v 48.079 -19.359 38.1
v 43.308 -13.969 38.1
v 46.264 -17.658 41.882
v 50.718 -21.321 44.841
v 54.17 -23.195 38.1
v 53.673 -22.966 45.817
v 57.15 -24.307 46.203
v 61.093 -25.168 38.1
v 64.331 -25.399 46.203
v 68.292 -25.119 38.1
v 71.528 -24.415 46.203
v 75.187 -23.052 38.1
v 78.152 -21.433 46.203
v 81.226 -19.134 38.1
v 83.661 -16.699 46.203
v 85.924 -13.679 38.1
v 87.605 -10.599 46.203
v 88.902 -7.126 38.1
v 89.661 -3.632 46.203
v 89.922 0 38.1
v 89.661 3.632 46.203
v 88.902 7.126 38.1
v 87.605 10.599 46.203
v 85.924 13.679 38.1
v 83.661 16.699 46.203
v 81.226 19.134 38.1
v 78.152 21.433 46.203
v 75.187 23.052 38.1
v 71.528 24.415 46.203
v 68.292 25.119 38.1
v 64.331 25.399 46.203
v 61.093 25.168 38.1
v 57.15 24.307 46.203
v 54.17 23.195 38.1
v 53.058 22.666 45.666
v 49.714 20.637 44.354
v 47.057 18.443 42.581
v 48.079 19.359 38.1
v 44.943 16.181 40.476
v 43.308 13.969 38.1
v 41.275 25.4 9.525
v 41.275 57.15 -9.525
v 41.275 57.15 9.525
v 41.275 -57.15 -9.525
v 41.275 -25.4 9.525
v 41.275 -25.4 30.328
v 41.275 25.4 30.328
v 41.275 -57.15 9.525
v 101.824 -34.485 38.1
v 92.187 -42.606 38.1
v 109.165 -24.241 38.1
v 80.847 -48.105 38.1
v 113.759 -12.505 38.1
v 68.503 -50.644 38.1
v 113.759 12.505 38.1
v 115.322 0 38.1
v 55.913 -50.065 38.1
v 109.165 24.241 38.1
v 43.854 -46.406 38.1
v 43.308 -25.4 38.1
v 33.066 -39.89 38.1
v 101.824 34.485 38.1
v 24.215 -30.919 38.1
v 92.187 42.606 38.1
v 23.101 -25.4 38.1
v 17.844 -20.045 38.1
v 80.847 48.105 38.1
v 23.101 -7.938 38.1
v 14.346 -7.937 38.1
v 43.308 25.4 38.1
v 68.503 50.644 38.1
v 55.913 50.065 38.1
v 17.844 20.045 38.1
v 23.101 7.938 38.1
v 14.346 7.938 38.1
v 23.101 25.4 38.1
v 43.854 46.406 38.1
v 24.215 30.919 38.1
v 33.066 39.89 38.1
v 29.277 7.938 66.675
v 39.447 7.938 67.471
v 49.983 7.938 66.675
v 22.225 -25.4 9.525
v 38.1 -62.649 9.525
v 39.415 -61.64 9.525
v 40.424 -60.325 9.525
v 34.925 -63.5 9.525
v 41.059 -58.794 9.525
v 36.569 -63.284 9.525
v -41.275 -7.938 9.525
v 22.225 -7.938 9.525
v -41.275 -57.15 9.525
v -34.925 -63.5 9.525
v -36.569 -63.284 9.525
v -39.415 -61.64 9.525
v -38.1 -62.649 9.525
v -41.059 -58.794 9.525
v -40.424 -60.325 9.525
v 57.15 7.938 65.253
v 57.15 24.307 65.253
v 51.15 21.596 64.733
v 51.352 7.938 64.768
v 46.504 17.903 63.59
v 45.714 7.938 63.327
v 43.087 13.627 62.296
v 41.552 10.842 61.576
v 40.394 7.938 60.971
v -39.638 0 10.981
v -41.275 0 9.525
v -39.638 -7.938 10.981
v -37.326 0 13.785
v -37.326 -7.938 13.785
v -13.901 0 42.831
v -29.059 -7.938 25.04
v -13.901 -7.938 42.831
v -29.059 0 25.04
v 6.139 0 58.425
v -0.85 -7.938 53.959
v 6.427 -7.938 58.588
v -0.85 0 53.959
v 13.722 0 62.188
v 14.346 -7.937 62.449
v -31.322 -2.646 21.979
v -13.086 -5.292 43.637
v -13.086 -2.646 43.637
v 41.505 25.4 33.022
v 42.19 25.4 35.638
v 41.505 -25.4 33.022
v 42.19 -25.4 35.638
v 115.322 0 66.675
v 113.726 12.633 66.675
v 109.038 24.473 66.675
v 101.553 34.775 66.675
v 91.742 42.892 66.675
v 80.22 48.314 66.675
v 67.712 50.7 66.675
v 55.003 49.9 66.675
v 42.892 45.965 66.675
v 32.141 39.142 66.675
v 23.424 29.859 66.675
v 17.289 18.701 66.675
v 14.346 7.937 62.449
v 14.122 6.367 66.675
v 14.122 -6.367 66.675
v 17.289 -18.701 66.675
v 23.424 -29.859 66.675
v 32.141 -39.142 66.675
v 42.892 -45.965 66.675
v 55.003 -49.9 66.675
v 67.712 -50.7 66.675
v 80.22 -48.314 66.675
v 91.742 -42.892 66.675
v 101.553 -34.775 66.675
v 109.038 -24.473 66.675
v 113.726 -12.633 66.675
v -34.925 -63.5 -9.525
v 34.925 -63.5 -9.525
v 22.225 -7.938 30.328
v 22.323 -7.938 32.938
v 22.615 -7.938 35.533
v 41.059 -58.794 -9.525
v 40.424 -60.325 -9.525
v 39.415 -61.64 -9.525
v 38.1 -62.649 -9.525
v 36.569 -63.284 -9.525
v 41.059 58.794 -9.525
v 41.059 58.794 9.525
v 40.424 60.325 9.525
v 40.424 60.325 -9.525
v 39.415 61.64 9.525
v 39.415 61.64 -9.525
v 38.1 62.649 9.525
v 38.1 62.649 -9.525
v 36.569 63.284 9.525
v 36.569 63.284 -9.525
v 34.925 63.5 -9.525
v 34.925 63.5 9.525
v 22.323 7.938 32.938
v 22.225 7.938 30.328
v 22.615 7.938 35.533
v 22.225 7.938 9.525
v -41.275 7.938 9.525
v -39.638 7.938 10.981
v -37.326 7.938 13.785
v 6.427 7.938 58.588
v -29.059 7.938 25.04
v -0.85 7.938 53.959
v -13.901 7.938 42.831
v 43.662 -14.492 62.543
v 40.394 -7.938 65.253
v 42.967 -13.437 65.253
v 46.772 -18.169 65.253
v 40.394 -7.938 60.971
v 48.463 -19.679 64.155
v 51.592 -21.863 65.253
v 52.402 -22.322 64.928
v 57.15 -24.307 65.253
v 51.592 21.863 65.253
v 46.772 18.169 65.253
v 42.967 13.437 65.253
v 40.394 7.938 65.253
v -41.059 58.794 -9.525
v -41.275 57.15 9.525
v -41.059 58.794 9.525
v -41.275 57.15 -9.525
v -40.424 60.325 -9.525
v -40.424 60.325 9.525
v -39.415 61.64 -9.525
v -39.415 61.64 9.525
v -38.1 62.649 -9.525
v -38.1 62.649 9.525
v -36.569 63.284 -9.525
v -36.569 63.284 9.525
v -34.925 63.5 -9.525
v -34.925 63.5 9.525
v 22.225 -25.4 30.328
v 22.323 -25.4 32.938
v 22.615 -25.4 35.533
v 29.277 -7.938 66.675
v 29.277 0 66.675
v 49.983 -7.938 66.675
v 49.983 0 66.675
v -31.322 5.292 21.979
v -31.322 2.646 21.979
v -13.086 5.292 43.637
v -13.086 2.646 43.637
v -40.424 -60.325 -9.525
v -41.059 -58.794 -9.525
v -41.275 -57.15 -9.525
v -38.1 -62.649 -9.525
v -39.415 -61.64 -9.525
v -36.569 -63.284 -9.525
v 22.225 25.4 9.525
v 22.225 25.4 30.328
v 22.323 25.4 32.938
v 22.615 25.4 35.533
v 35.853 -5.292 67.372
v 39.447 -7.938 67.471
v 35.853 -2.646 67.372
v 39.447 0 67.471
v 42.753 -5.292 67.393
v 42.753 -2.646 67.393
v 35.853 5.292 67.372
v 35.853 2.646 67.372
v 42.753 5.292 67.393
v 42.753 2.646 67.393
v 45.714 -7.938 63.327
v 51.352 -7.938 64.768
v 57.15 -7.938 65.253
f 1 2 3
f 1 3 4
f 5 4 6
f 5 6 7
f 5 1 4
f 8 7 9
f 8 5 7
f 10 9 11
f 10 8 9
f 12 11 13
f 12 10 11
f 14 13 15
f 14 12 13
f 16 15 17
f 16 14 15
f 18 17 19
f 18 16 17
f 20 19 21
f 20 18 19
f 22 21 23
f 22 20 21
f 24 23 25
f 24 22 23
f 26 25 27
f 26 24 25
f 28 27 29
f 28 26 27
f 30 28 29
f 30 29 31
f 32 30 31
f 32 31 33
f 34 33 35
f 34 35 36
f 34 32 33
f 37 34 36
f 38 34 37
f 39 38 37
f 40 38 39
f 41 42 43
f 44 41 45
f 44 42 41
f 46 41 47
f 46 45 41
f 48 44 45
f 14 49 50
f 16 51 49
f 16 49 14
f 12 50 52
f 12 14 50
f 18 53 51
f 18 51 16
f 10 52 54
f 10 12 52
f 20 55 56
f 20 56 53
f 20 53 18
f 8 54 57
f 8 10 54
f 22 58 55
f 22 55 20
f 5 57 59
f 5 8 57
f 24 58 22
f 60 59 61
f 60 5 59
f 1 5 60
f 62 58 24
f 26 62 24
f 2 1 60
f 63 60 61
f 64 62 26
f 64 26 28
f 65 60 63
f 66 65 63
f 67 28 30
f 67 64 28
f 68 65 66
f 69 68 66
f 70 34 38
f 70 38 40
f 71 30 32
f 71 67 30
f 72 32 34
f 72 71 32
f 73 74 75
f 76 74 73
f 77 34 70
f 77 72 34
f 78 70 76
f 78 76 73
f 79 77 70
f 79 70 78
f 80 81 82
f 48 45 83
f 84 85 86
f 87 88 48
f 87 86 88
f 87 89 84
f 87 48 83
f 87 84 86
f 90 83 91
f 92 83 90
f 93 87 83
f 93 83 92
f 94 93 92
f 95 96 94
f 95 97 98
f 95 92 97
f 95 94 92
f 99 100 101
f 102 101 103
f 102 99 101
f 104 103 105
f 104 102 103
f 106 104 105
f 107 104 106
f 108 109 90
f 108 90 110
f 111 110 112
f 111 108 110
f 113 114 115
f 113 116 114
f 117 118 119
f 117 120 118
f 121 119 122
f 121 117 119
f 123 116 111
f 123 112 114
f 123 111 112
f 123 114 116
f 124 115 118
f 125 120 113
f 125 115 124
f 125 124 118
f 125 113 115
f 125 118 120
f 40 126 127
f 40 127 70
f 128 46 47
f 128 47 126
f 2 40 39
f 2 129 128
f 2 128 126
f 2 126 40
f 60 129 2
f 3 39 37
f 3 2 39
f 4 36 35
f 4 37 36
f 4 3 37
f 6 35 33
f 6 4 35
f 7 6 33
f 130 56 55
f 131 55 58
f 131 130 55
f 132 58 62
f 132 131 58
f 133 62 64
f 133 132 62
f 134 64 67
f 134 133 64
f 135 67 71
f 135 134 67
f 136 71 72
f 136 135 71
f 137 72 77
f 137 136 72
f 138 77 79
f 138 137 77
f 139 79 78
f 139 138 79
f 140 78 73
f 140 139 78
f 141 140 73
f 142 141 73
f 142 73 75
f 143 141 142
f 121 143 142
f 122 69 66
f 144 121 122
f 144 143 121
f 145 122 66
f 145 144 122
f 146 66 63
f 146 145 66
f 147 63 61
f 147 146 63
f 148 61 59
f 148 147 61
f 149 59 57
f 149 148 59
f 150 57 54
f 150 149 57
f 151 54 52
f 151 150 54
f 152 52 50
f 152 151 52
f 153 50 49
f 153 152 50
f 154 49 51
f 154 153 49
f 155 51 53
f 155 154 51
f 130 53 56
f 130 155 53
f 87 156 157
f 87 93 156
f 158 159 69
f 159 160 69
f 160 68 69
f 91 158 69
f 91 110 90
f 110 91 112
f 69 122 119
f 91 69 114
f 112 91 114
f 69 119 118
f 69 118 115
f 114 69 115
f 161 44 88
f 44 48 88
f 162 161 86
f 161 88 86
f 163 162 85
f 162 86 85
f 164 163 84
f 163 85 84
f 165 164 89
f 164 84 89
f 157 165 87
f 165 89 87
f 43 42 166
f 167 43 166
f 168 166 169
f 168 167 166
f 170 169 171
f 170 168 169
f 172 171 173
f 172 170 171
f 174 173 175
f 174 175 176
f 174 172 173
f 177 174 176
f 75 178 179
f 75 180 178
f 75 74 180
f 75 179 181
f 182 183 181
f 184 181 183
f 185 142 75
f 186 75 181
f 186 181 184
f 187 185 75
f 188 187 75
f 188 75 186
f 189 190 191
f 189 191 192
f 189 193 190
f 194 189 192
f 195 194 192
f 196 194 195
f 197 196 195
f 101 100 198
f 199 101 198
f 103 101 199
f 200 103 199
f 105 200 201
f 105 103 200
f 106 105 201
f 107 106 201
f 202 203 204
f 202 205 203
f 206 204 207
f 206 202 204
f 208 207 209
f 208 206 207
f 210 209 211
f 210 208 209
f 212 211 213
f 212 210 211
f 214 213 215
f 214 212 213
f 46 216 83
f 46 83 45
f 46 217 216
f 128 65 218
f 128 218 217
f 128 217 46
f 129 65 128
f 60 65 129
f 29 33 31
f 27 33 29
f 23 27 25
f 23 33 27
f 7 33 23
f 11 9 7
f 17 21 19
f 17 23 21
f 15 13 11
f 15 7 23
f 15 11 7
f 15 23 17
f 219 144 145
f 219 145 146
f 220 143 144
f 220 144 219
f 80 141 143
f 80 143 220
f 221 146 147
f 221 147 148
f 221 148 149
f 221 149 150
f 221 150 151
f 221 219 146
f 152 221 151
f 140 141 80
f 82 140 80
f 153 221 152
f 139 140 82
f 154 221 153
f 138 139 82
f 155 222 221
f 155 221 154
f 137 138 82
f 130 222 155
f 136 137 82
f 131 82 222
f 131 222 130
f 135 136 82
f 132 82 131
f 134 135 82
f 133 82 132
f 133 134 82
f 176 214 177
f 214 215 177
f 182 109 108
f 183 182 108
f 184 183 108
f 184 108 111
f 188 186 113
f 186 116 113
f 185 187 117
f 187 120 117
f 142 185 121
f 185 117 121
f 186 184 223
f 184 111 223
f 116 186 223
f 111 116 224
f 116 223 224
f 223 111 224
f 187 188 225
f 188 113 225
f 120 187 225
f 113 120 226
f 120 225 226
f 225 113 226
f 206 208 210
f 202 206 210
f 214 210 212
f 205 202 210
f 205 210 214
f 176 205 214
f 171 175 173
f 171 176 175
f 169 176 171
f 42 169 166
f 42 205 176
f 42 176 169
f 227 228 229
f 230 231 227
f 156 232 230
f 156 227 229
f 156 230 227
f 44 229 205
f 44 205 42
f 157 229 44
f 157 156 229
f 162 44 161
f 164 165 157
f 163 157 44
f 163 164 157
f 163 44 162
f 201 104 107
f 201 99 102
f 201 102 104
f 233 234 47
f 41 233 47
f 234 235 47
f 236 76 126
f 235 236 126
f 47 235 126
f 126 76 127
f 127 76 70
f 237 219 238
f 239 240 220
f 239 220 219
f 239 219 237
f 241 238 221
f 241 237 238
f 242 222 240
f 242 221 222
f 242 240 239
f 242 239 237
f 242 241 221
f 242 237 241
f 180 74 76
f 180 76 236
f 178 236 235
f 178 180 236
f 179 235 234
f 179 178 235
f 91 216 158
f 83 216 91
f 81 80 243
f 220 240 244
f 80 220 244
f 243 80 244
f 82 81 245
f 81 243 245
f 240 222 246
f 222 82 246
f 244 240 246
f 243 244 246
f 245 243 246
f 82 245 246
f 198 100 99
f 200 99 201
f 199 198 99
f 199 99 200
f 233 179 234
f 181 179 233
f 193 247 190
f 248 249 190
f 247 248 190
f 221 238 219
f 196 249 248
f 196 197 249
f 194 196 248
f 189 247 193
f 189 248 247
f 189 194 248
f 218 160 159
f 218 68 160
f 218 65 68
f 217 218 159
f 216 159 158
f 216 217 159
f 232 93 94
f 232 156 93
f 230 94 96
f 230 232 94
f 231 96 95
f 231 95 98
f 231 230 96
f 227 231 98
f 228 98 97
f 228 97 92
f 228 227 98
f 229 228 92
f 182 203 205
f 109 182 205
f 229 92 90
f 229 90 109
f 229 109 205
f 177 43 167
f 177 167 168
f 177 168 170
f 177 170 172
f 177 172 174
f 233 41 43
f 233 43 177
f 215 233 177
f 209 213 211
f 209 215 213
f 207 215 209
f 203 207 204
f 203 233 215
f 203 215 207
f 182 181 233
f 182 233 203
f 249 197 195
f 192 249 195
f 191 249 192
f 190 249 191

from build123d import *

# Parameters (mm, degrees)
F1_DEPTH = 63.5
F0_W     = 25.4
F0_H     = 19.05
F2_DEPTH = 25.4
F3_DEPTH = 7.9375
F5_R     = 6.35


with BuildPart() as f1:
    # F0 (on Front) → F1 (new body, symmetric)
    with BuildSketch(Plane.XZ):
        Polygon((-41.275, -9.525), (41.275, -9.525), (41.275, 9.525), (22.225, 9.525), (-41.275, 9.525), align=None)
    extrude(amount=F1_DEPTH, both=True)

    # F0 (on Front) → F2 (join, symmetric)
    with BuildSketch(Plane.XZ):
        with BuildLine():
            Line((22.225, 9.525), (41.275, 9.525))
            Line((41.275, 9.525), (41.275, 30.3276))
            ThreePointArc((41.275, 30.3276), (45.9246798487, 41.5529201513), (57.15, 46.2026))
            Line((57.15, 46.2026), (64.5218447655, 46.2026))
            Line((64.5218447655, 46.2026), (64.5218447655, 65.2526))
            Line((64.5218447655, 65.2526), (57.15, 65.2526))
            ThreePointArc((57.15, 65.2526), (32.4542956671, 55.0233043329), (22.225, 30.3276))
            Line((22.225, 30.3276), (22.225, 9.525))
        make_face()
        with Locations((77.2218447655, 55.7276)):
            Rectangle(F0_W, F0_H)
    extrude(amount=F2_DEPTH, both=True)

    # F0 (on Front) → F3 (join, symmetric)
    with BuildSketch(Plane.XZ):
        with BuildLine():
            add(Edge.make_bspline(
                [(-41.275, 9.525), (-32.8745953739, 14.7935664281), (-3.6162044853, 80.2140161395), (57.15, 65.2526)],
                knots=[0, 0, 0, 0, 113.1063483044, 113.1063483044, 113.1063483044, 113.1063483044], degree=3))
            Line((-41.275, 9.525), (22.225, 9.525))
            Line((22.225, 9.525), (22.225, 30.3276))
            ThreePointArc((22.225, 30.3276), (32.4542956671, 55.0233043329), (57.15, 65.2526))
        make_face()
    extrude(amount=F3_DEPTH, both=True)

    # F0 (on Front) → F4 (revolve)
    with BuildSketch(Plane.XZ):
        Polygon((64.5218447655, 66.675), (64.5218447655, 65.2526), (89.9218447655, 65.2526), (89.9218447655, 46.2026), (89.9218447655, 38.1), (115.3218447655, 38.1), (115.3218447655, 66.675), align=None)
    revolve(axis=Axis((64.5218447655, 0, 52.3875), (0, 0, 1)))

    # F5
    f5_edges = [f1.edges().sort_by_distance(p)[0] for p in [
        (41.275, -63.5, 0),
        (-41.275, -63.5, 0),
        (41.275, 63.5, 0),
        (-41.275, 63.5, 0),
    ]]
    fillet(f5_edges, radius=F5_R)


solid = f1.part
